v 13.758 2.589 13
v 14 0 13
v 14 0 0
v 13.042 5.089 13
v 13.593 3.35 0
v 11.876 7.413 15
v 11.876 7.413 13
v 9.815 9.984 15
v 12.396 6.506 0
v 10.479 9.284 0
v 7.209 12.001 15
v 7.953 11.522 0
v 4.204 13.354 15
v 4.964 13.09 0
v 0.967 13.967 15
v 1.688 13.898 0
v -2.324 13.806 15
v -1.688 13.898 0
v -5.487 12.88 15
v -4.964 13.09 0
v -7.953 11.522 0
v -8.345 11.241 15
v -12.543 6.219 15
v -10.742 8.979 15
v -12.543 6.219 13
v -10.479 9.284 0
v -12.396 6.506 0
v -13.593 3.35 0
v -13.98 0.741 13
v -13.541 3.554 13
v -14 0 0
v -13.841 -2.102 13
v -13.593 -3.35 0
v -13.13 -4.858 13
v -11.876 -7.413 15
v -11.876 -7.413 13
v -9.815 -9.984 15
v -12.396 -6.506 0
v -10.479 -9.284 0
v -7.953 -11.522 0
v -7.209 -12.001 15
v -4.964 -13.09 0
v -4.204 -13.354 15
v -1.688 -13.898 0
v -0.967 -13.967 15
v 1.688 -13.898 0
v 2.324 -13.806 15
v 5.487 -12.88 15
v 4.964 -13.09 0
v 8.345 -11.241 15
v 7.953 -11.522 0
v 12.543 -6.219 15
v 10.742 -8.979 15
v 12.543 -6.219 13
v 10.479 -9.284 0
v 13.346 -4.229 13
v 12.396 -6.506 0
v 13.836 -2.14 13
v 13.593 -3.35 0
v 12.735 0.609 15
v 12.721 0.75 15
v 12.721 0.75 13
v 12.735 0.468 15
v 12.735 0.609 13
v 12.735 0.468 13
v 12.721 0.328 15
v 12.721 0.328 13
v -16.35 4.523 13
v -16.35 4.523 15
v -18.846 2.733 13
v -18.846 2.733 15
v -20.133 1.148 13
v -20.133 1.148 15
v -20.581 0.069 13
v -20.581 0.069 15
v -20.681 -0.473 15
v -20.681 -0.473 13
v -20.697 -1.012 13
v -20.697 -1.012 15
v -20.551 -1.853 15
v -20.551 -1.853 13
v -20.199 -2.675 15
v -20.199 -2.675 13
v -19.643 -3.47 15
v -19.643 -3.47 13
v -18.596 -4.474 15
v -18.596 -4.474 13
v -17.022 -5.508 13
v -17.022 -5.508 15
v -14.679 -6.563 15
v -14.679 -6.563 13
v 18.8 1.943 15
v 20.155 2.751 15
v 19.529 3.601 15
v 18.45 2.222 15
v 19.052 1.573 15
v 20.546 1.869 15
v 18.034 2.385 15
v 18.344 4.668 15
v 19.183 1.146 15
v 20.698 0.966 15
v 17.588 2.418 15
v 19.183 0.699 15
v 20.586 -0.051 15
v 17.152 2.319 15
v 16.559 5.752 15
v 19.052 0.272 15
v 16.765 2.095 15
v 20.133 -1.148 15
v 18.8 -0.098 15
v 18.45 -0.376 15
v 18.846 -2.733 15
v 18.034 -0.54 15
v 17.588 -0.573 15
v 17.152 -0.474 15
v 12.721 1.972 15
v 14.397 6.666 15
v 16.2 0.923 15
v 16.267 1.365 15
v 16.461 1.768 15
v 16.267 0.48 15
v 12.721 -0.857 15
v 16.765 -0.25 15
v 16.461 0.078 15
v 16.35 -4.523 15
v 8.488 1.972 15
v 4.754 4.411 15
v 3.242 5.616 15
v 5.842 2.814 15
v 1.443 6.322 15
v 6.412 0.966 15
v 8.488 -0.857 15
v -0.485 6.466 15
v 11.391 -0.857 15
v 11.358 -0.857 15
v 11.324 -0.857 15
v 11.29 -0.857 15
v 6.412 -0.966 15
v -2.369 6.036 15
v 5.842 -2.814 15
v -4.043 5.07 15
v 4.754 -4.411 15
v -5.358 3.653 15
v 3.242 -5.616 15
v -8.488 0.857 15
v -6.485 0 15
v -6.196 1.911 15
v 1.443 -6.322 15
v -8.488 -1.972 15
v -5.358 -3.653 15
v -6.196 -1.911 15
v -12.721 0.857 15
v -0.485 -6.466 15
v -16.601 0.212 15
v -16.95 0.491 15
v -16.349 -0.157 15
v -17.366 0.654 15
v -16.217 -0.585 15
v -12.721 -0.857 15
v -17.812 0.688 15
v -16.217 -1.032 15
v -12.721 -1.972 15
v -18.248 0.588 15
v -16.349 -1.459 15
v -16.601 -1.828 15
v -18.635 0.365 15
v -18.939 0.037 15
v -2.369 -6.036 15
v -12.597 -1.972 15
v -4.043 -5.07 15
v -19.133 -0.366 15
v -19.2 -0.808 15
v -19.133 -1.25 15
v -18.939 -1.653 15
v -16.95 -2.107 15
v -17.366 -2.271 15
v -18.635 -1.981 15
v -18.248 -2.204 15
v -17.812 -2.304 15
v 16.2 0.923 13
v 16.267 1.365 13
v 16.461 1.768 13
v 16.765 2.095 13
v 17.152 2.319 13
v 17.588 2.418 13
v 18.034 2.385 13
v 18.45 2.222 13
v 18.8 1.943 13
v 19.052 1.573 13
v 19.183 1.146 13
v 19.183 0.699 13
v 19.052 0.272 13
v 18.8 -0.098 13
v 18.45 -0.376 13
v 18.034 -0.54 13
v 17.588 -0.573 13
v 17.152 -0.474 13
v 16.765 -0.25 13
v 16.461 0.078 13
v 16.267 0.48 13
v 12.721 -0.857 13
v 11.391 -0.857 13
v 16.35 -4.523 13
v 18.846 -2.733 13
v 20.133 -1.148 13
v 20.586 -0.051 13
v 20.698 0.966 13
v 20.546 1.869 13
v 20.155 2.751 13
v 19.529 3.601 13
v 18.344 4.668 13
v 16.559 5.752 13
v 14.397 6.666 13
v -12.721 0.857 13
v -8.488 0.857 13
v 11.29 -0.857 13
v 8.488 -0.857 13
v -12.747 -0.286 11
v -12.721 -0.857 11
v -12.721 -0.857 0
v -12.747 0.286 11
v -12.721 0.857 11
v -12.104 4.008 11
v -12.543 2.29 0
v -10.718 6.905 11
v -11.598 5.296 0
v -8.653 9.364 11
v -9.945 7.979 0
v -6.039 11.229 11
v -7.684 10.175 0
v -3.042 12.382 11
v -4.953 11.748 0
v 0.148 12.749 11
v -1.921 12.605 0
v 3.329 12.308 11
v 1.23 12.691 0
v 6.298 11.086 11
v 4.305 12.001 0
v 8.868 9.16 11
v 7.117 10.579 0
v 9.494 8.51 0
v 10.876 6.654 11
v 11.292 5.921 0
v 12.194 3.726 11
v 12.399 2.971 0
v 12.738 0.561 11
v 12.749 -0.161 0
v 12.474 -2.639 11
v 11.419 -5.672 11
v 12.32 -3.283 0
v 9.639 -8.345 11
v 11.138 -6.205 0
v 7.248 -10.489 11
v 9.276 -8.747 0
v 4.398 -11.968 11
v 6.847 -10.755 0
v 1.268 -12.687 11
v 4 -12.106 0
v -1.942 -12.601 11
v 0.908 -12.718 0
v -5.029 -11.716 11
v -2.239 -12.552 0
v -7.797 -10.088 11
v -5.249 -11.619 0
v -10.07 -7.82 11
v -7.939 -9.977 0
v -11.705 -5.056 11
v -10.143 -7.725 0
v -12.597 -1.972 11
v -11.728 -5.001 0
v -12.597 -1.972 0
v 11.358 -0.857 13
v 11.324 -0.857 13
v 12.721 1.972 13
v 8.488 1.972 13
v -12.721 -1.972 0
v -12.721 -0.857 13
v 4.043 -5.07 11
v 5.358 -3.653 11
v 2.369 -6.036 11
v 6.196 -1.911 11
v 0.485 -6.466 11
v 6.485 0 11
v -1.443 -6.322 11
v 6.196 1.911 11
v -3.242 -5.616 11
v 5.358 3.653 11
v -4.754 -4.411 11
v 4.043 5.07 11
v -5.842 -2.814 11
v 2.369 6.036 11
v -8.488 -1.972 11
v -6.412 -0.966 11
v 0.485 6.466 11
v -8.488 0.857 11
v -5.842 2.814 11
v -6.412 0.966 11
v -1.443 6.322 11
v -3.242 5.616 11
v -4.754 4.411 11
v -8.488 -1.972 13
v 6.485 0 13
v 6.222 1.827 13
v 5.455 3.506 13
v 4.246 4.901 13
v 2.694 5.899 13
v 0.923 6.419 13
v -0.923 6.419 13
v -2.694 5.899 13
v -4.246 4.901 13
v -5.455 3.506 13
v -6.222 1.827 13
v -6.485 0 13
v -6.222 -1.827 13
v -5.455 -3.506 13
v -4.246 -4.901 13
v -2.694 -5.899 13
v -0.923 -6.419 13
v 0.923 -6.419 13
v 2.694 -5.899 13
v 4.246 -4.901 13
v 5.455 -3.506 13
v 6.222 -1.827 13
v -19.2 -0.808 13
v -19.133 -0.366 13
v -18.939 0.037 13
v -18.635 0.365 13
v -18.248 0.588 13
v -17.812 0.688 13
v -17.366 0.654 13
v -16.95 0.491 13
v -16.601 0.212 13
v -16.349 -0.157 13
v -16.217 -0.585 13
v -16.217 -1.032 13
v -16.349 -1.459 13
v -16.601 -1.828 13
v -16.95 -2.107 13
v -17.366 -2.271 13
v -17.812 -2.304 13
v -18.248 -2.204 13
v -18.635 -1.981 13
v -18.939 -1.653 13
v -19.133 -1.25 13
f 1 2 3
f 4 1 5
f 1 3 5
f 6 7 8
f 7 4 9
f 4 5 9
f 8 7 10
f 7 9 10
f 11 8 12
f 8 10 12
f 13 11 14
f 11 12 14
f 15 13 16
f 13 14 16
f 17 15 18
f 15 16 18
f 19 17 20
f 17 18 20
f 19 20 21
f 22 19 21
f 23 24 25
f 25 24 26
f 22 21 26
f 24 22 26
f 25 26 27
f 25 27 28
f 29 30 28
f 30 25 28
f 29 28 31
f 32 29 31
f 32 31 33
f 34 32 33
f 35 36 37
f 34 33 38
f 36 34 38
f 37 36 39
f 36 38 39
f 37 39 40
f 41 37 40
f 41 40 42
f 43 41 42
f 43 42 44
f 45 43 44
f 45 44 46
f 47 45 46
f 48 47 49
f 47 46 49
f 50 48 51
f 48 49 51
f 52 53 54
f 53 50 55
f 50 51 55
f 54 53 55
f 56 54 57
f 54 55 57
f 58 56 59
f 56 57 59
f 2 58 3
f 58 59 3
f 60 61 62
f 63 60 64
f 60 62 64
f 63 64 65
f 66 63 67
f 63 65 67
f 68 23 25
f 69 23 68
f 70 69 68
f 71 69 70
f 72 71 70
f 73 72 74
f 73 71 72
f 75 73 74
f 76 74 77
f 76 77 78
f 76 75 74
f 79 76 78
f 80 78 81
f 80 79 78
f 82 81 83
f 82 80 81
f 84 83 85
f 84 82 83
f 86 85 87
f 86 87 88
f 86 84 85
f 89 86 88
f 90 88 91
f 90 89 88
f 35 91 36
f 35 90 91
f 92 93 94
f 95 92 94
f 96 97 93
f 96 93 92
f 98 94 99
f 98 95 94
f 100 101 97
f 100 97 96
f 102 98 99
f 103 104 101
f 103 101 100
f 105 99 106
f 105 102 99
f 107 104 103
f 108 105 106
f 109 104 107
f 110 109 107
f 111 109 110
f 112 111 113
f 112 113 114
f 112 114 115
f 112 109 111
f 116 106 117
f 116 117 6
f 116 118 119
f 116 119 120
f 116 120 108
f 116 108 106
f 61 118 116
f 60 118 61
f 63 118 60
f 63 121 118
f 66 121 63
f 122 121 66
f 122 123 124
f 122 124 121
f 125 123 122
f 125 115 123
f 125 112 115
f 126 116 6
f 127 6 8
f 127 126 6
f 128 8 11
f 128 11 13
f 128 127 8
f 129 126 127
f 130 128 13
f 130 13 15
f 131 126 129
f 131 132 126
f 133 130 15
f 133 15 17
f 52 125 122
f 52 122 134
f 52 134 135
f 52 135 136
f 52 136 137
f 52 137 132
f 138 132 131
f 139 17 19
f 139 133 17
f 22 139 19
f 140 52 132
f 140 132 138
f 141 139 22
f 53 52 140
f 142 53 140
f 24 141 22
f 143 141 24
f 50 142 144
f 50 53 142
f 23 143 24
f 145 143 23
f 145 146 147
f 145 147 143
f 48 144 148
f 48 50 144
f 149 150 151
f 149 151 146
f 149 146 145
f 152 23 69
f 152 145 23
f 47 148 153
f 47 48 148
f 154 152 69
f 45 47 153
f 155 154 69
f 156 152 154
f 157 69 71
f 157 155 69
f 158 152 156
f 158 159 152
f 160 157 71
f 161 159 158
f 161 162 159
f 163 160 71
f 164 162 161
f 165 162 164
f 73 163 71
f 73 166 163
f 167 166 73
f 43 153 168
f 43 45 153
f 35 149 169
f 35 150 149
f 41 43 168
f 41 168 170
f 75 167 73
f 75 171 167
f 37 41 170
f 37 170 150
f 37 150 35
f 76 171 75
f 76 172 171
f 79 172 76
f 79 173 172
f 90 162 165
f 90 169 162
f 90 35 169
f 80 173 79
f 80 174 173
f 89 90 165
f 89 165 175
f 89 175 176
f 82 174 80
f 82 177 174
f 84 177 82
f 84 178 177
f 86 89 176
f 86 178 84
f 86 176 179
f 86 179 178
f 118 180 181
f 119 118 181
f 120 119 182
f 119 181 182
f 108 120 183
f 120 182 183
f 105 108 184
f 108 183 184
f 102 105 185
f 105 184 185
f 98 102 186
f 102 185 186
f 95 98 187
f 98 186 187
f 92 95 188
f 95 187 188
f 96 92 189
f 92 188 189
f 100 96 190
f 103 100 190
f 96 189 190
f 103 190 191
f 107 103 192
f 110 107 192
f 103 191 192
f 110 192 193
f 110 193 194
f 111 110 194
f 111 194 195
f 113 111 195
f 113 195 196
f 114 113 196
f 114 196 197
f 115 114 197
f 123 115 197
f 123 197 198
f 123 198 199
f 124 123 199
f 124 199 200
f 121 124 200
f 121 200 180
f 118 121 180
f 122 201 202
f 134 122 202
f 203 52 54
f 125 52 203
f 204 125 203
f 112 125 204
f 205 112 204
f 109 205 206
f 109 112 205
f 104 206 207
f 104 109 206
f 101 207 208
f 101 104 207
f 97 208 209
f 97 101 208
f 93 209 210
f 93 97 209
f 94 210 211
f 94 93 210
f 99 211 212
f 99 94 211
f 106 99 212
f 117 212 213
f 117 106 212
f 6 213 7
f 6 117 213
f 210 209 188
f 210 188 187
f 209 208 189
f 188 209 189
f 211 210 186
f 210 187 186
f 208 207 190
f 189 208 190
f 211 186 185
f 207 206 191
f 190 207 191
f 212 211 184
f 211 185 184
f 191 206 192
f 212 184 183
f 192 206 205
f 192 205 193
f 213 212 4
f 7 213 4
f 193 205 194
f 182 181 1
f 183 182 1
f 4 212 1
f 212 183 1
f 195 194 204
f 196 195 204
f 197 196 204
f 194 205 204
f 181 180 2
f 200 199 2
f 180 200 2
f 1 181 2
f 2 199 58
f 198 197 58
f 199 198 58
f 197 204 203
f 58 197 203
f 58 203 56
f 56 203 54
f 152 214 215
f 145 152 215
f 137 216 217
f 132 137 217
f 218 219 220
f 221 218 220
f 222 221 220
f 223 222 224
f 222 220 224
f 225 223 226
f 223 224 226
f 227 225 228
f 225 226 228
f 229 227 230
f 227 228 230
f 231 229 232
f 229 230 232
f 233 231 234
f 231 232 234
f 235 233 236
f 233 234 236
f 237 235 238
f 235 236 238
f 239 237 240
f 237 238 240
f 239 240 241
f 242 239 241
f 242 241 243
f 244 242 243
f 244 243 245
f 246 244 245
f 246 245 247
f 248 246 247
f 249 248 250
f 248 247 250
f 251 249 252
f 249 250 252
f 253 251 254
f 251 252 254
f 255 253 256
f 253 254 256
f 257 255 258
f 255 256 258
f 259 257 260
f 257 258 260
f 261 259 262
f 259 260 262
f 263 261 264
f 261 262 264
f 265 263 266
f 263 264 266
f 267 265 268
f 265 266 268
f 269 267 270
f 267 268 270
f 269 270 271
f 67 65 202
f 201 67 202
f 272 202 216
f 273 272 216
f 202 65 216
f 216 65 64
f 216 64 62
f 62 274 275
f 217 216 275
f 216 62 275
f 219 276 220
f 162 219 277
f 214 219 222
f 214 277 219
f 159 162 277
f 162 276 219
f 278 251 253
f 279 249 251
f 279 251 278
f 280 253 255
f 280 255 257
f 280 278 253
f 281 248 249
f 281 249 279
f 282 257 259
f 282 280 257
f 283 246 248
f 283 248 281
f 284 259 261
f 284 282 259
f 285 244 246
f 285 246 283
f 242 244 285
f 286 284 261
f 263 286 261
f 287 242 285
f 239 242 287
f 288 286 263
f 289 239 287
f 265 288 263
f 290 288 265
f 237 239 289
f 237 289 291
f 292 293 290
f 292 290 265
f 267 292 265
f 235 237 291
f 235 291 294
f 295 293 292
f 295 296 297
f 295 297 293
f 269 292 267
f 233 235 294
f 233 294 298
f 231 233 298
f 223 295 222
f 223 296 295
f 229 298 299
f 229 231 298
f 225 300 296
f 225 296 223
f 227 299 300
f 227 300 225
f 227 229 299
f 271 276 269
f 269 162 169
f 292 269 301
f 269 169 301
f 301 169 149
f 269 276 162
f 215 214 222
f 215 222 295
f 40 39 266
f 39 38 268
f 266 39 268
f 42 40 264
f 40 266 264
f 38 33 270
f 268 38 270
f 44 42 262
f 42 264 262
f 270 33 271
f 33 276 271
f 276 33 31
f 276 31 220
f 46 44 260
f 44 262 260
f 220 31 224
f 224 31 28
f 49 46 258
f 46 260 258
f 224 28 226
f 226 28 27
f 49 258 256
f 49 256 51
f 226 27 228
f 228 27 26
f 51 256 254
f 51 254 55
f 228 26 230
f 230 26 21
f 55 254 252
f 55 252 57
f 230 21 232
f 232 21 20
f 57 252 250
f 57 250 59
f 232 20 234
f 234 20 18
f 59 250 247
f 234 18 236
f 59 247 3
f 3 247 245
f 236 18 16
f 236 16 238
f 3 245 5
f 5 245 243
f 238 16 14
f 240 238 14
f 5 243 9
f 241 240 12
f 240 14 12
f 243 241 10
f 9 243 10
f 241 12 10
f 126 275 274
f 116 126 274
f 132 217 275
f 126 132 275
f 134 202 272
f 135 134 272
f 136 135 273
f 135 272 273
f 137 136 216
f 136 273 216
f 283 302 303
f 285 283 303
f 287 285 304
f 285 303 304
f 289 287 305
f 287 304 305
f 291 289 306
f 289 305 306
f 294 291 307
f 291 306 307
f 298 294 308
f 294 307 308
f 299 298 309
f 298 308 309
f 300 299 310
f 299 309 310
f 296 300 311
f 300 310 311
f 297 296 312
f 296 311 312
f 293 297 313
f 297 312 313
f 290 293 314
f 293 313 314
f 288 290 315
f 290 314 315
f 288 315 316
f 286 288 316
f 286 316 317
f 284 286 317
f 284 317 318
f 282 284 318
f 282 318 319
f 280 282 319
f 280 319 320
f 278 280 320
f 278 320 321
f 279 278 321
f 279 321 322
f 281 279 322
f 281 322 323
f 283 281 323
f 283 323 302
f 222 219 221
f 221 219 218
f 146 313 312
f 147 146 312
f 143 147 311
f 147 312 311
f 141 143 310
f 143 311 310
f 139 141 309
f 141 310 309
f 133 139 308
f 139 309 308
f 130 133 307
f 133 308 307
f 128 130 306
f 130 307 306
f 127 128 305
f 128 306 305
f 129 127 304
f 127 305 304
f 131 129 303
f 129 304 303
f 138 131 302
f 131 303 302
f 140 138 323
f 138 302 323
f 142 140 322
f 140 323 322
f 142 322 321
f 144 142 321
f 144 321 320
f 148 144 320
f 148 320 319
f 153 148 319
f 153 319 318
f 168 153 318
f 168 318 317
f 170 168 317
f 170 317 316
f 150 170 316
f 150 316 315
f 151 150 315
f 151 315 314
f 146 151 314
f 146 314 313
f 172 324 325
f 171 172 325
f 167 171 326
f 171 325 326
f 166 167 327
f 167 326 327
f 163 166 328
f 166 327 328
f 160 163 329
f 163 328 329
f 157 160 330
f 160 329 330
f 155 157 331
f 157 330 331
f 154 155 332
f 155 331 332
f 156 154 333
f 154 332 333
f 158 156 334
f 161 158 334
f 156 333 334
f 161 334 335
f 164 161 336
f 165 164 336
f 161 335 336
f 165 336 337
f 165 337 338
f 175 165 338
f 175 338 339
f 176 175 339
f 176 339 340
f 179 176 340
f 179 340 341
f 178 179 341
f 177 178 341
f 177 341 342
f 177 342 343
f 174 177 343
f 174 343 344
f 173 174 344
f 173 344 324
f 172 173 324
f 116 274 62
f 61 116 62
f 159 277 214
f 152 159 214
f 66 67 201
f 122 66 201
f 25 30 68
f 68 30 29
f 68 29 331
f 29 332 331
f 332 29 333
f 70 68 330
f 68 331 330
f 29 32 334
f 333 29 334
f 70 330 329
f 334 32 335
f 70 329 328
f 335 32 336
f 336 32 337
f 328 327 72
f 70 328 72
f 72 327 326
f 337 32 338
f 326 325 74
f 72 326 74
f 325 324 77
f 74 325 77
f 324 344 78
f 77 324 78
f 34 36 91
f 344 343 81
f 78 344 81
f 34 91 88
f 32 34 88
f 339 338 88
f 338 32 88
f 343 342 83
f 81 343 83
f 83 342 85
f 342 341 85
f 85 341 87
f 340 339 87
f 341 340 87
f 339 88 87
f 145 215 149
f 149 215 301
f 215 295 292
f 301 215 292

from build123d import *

# Parameters (mm, degrees)
IZIM7_R                     = 14
Y_KSEKLIK_EKSTR_ZYON3_DEPTH = 15
IZIM8_R                     = 12.75
KES_EKSTR_ZYON2_DEPTH       = 13
IZIM10_RX                   = 20.721224891
IZIM10_RY                   = 8.451844087
Y_KSEKLIK_EKSTR_ZYON5_DEPTH = 2
IZIM11_R                    = 1.5
KES_EKSTR_ZYON4_DEPTH       = 12
IZIM12_R                    = 1.39637185
KES_EKSTR_ZYON5_DEPTH       = 12
IZIM13_R                    = 1.39637185
KES_EKSTR_ZYON9_DEPTH       = 10
IZIM17_R                    = 6.48453934
KES_EKSTR_ZYON10_DEPTH      = 10
IZIM18_R                    = 12.75
Y_KSEKLIK_EKSTR_ZYON6_DEPTH = 2
IZIM19_R                    = 6.48453934
KES_EKSTR_ZYON11_DEPTH      = 15
IZIM20_W                    = 4.233334515
IZIM20_H                    = 2.828390799
KES_EKSTR_ZYON12_DEPTH      = 15


with BuildPart() as part:
    # Çizim7 → Yükseklik-Ekstrüzyon3 (new body)
    with BuildSketch(Plane.XY):
        Circle(IZIM7_R)
    extrude(amount=Y_KSEKLIK_EKSTR_ZYON3_DEPTH)

    # Çizim8 → Kes-Ekstrüzyon2 (cut)
    with BuildSketch(Plane(origin=(0, 0, 0), x_dir=(-1, 0, 0), z_dir=(0, 0, -1))):
        Circle(IZIM8_R)
    extrude(amount=-KES_EKSTR_ZYON2_DEPTH, mode=Mode.SUBTRACT)

    # Çizim10 → Yükseklik-Ekstrüzyon5 (add)
    with BuildSketch(Plane.XY.offset(15)):
        with Locations(Location((0, 0), (0, 0, -177.201101486))):
            Ellipse(IZIM10_RX, IZIM10_RY)
    extrude(amount=-Y_KSEKLIK_EKSTR_ZYON5_DEPTH)

    # Çizim11 → Kes-Ekstrüzyon4 (cut)
    with BuildSketch(Plane(origin=(0, 0, 13), x_dir=(-1, 0, 0), z_dir=(0, 0, -1))):
        with Locations((-17.700084822, 0.922540909)):
            Circle(IZIM11_R)
        with Locations((17.700084822, -0.808134051)):
            Circle(IZIM11_R)
    extrude(amount=-KES_EKSTR_ZYON4_DEPTH, mode=Mode.SUBTRACT)

    # Çizim12 → Kes-Ekstrüzyon5 (cut)
    with BuildSketch(Plane(origin=(0, 0, 13), x_dir=(-1, 0, 0), z_dir=(0, 0, -1))):
        with Locations((-11.340835644, 0.538812648)):
            Circle(IZIM12_R)
        with Locations((11.231387984, -0.55728261)):
            Circle(IZIM12_R)
    extrude(amount=-KES_EKSTR_ZYON5_DEPTH, mode=Mode.SUBTRACT)

    # Çizim13 → Kes-Ekstrüzyon9 (cut)
    with BuildSketch(Plane(origin=(0, 0, 13), x_dir=(-1, 0, 0), z_dir=(0, 0, -1))):
        with BuildLine():
            Line((8.487842828, 0.857001804), (8.487842828, -1.971567024))
            Line((8.487842828, -1.971567024), (12.596643341, -1.971567024))
            ThreePointArc((12.596643341, -1.971567024), (12.671184838, -1.415476879), (12.721189334, -0.856645746))
            Line((12.721189334, -0.856645746), (12.721189334, 0.857001804))
            Line((12.721189334, 0.857001804), (8.487842828, 0.857001804))
        make_face()
        with Locations((11.231387984, -0.55728261)):
            Circle(IZIM13_R, mode=Mode.SUBTRACT)
        with BuildLine():
            Line((-12.721189334, 0.327914487), (-12.721189334, -0.856645746))
            Line((-12.721189334, -0.856645746), (-11.391335286, -0.856645746))
            ThreePointArc((-11.391335286, -0.856645746), (-12.269614978, -0.503887353), (-12.721189334, 0.327914487))
        make_face()
        with BuildLine():
            Line((-12.721189334, 1.971923081), (-12.721189334, 0.749710808))
            ThreePointArc((-12.721189334, 0.749710808), (-10.298135643, 1.467591981), (-11.290336002, -0.856645746))
            Line((-11.290336002, -0.856645746), (-8.487842828, -0.856645746))
            Line((-8.487842828, -0.856645746), (-8.487842828, 1.971923081))
            Line((-8.487842828, 1.971923081), (-12.721189334, 1.971923081))
        make_face()
    extrude(amount=-KES_EKSTR_ZYON9_DEPTH, mode=Mode.SUBTRACT)

    # Çizim17 → Kes-Ekstrüzyon10 (cut)
    with BuildSketch(Plane(origin=(0, 0, 13), x_dir=(-1, 0, 0), z_dir=(0, 0, -1))):
        Circle(IZIM17_R)
    extrude(amount=-KES_EKSTR_ZYON10_DEPTH, mode=Mode.SUBTRACT)

    # Çizim18 → Yükseklik-Ekstrüzyon6 (add)
    with BuildSketch(Plane(origin=(0, 0, 13), x_dir=(-1, 0, 0), z_dir=(0, 0, -1))):
        Circle(IZIM18_R)
    extrude(amount=Y_KSEKLIK_EKSTR_ZYON6_DEPTH)

    # Çizim19 → Kes-Ekstrüzyon11 (cut)
    with BuildSketch(Plane.XY.offset(13)):
        Circle(IZIM19_R)
    extrude(amount=-KES_EKSTR_ZYON11_DEPTH, mode=Mode.SUBTRACT)

    # Çizim20 → Kes-Ekstrüzyon12 (cut)
    with BuildSketch(Plane.XY.offset(15)):
        with Locations((-10.604510085, -0.557371624)):
            Rectangle(IZIM20_W, IZIM20_H)
    extrude(amount=-KES_EKSTR_ZYON12_DEPTH, mode=Mode.SUBTRACT)


solid = part.part
